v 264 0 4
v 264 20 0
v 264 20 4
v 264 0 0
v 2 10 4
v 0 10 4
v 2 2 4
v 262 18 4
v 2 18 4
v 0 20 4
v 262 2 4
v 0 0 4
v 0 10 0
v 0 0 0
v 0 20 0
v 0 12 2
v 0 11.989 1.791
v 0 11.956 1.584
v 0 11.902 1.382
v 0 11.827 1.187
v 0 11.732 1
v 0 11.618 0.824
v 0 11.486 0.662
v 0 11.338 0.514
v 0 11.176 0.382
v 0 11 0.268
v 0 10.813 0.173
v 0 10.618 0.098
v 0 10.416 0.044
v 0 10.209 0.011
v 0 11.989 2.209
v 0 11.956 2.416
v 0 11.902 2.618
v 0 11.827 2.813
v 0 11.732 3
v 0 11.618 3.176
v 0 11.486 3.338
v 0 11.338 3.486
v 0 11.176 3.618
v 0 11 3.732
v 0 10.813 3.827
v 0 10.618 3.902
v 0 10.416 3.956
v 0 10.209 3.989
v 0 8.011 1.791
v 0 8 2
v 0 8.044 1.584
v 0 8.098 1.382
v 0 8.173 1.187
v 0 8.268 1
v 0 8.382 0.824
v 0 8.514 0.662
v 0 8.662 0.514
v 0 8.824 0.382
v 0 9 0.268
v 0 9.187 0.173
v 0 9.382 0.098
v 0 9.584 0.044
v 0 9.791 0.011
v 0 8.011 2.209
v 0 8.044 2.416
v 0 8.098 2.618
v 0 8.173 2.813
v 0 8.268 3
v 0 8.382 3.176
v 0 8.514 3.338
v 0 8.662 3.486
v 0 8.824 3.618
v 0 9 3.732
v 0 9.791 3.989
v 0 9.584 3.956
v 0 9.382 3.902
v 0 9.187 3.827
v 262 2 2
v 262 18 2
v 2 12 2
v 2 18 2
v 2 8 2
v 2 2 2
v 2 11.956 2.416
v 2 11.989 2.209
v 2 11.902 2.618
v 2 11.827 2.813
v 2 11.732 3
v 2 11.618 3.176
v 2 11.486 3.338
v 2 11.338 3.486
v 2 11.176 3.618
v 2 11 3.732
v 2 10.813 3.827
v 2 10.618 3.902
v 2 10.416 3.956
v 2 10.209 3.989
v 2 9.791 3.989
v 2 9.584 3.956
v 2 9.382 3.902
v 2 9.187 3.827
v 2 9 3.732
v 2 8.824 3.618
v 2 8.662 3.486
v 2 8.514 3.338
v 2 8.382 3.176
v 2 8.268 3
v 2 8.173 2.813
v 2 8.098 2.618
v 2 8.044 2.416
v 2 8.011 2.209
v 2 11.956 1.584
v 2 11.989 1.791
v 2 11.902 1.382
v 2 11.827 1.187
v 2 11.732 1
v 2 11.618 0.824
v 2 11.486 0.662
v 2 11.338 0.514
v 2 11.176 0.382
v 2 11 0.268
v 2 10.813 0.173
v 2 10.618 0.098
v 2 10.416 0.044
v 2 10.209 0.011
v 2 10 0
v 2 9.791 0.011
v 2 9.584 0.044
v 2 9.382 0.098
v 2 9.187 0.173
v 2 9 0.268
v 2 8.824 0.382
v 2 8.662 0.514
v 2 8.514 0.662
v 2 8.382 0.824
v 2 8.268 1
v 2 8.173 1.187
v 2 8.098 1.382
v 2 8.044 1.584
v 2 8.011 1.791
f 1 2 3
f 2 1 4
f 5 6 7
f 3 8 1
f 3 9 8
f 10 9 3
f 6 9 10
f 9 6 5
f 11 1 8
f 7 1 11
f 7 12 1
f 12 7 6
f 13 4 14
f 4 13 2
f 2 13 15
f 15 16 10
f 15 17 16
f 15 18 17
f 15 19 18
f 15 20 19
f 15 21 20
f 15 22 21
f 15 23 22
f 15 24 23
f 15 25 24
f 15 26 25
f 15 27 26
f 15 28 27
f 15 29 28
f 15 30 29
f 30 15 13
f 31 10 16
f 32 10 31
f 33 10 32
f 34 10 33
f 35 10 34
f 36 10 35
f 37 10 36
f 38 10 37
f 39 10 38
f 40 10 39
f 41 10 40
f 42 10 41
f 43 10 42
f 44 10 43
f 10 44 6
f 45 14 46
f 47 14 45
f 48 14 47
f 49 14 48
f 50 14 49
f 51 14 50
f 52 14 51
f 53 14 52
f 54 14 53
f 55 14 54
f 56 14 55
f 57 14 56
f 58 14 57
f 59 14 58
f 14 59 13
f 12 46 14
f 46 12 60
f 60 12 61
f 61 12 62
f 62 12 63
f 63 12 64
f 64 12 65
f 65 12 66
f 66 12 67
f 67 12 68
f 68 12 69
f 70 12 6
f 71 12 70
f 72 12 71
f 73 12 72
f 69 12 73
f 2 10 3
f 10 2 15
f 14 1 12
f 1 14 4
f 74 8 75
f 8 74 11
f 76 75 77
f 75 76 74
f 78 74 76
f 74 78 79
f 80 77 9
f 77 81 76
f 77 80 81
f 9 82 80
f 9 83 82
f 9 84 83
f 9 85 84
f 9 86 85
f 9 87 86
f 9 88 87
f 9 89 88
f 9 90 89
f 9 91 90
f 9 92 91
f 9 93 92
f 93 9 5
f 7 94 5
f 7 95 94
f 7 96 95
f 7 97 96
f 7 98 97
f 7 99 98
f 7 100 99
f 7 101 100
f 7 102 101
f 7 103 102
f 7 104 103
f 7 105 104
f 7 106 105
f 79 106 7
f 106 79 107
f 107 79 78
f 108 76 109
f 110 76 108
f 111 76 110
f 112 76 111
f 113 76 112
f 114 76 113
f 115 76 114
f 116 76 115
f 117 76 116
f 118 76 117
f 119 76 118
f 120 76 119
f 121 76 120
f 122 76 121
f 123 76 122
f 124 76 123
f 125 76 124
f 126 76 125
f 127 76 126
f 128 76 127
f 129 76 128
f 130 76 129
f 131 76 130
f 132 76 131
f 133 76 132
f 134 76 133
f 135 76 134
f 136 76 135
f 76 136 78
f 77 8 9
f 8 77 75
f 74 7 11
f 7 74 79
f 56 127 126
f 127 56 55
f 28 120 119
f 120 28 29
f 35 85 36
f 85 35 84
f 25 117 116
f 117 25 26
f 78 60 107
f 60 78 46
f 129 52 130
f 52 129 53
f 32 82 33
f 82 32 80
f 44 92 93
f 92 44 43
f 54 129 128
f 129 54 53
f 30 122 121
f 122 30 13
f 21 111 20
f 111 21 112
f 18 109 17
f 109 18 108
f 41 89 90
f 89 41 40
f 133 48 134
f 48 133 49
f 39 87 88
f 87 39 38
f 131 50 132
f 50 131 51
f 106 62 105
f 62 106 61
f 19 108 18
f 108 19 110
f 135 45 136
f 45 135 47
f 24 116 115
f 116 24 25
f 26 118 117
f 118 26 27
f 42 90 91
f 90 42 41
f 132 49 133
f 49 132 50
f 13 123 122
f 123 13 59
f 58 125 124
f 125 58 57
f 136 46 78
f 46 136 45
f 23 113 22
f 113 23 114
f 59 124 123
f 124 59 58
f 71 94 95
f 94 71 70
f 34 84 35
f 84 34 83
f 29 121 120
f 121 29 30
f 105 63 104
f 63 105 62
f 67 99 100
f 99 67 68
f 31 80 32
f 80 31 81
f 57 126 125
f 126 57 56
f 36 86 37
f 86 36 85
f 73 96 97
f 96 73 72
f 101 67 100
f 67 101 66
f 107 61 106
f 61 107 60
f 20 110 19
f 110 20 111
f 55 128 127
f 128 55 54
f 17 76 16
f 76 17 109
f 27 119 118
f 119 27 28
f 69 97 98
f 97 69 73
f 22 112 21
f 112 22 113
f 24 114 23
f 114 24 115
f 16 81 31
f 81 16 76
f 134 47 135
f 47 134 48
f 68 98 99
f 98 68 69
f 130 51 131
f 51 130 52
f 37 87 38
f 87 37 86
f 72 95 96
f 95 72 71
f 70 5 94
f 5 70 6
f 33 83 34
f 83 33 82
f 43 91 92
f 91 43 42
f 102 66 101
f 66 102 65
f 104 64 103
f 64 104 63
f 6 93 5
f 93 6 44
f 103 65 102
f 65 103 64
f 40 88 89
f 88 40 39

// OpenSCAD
// file: ../references.scad
// Size
//Naming
// _PT = printable
// _ES = exact size
// _IS = insertable with force but no gaps

//--------------cables  (CB)

//----Ethernet (rj45)

//not mesured yet
CB_RJ45_Diameter_ES=4; 

//--------------threaded rod  (TR)

//----M5

TR_M5_Diameter_ES = 5.8;
//for a hole 
TR_M5_Diamater_IS = 6;
TR_M5_Diamater_PT = 7;


//----M10

TR_M10_Diameter_ES = 9.6;
//for a hole 
TR_M10_Diamater_IS = 10;
TR_M10_Diamater_PT = 12;

//--------------Screw (SC)
//----M3

module body_M3(height_input){
    cylinder(d=SC_M3_Diameter_PT,h=height_input,$fn=60);
    
    }
    
SC_M3_Diameter_ES = 2.96;
SC_M3_Head_Diameter_ES = 5.90;
SC_M3_Head_Height_ES = 2.32;
//for a hole 
SC_M3_Diameter_PT = 4; 


//----M5

SC_M5_Diameter_ES = 4.86;
SC_M5_Head_Diameter_ES = 9.24;
SC_M5_Head_Height_ES = 3.0;
//for a hole 
SC_M5_Diamater_IS = 5;
SC_M5_Diamater_PT = 0; //inconnu pour le moment


//--------------Nut Bolt (NB)

module nut_M3(height_input){
    cylinder(d=NB_M3_Diameter_C2C_PT,h=height_input,$fn=6);
    
    }

//----M3
// Side to side = from 2 paralelle faces S2S
// corner to corner = from 2 corners C2C


NB_M3_Diameter_S2S_ES = 5.30;
NB_M3_Diameter_C2C_ES = 6.0;

NB_M3_Diameter_S2S_PT = 6.30; //reducing as well
NB_M3_Diameter_C2C_PT = 7.0; //8.0 was too much 


//--------------Zip ties (ZT)

//Big zip ties I got    

ZT_length_ES = 300;
ZT_width_ES = 4.8;
ZT_height_ES = 1;

ZT_width_PT = 7;
ZT_height_PT = 3;

//--------------Velcro tape (VT)



VT_length_ES = 300;
VT_width_ES = 20;
VT_height_ES = 1;

VT_width_PT = 22;
VT_height_PT = 3;



//--------------Switch (SW)
//switch from castorama 
SW_length_ES = 13;
SW_width_ES = 8;
SW_height_ES = 14;

SW_length_PT = 15;
SW_width_PT = 10;
SW_height_PT = 16;


//switch from aliexpress
SW_AL_tube_width_ES = 5.7;
SW_AL_tube_width_PT = 7;

module custom_cylinder_switch(translated_position_X, translated_position_Y,translated_position_Z,heigh_input) {
    translate([translated_position_X, translated_position_Y, translated_position_Z]){ 
        rotate([90,0,0]){
            cylinder(d=SW_AL_tube_width_PT, h=heigh_input, $fn=30);
        }
    }
}
module custom_cylinder(rotate_input,translate_input,diameter_object,height_object){
    translate(translate_input){
        rotate(rotate_input){
            cylinder(d=diameter_object,h=height_object,$fn=60);
        }
    }
}

//--------------generic connectors (GC)
// USB C (USB-C)
GC_USB_C_length_ES = 7.3;
GC_USB_C_width_ES = 8.8;
GC_USB_C_height_ES = 3;

module USB_C(rotate_input,translate_input){
    translate(translate_input){
    rotate(rotate_input){
        hull(){
    cylinder(d=GC_USB_C_height_ES,h=GC_USB_C_length_ES,$fn=60);
translate([0,GC_USB_C_width_ES-GC_USB_C_height_ES,0]){
    cylinder(d=GC_USB_C_height_ES,h=GC_USB_C_length_ES,$fn=60);
}
}
    }
}
}

//--------------battery from vapes (BV)

//vapes crystal pro battery (CP)
BV_CP_length_ES = 34;
BV_CP_width_ES = 20;
BV_CP_height_ES = BV_CP_width_ES; //(because it's a cylinder)

BV_CP_length_PT = 37;
BV_CP_width_PT = 22;
BV_CP_height_PT = BV_CP_width_ES; //(because it's a cylinder)

//dimension list [legnth, width, height]
//BV_CP_PT=[37,22,22];
BV_CP_PT=[BV_CP_length_PT,BV_CP_width_PT,BV_CP_height_PT];

module vapes_battery(input_list,rotate_input,translate_input){
translate(translate_input){
    rotate(rotate_input){
        color("green")cylinder(d=input_list[1],h=input_list[0],$fn=60);
    }
    }
}


//--------------battery charger (BC)
//Board Charger TP4056 Module  (TP)

//https://www.az-delivery.uk/cdn/shop/products/tp4056-batterieladungsmodul-usb-typ-c-schutzschaltung-led-anzeigen-fur-ihre-li-ion-oder-lipo-einzelzellenbatterien-126337.jpg?v=1694708173


BC_TP_length_ES = 28;
BC_TP_full_length_ES = 28; //usb C end included
BC_TP_width_ES = 17;
BC_TP_height_ES = 1.3; //without USB C
BC_TP_full_height_ES = 5; //with USB C



//usb C connector position
BC_TP_width_from_side_ES = 8.44;//center of USB C connector from bottom (view from the top )
BC_TP_height_from_bottom_ES = 3.4;//center of USB C connector from bottom (view from the top )
BC_TP_negative_length_ES = 2;//center of USB C connector from bottom 

module battery_charger(rotate_input,translate_input){
    translate(translate_input){
    rotate(rotate_input){
        color("green"){
            cube([BC_TP_full_length_ES,BC_TP_width_ES,BC_TP_height_ES]);

                rotate_array_USB_C=[0,90,0];
    translate_array_USB_C=[-BC_TP_negative_length_ES,BC_TP_width_ES/2-(GC_USB_C_width_ES-GC_USB_C_height_ES)/2,GC_USB_C_height_ES/2+BC_TP_height_ES];
    
    USB_C(rotate_array_USB_C,translate_array_USB_C);

            
            }
    }
}
    
    }


//https://www.alectrofag.co.uk/cdn/shop/files/Hayati_Pro_Max_4000_Puffs_Disposable_Vape.jpg?v=1725012272




//https://d138zd1ktt9iqe.cloudfront.net/media/seo_landing_files/length-width-height-01-1646654708.png
// main file
include <../../Household/references.scad>

// Define variables for the dimensions and hole positions in millimeters

//size LED string
length_led_string = 260;
width_led_string = 16;
height_led_string = 2;

//structure
wall_thickness = 2;
gap_for_room = 2;


module hole_for_cable(){
    rotate_array_cable=[0,90,0];
    translate_array_cable=[0,(width_led_string+gap_for_room+wall_thickness)/2,(height_led_string+gap_for_room)/2];
    custom_cylinder(rotate_input=rotate_array_cable,translate_input=translate_array_cable,diameter_object=CB_RJ45_Diameter_ES,height_object=wall_thickness);
    }


module main(){
    difference() {
        cube([(length_led_string+gap_for_room+wall_thickness),width_led_string+gap_for_room+wall_thickness ,height_led_string+gap_for_room]);
        translate([(gap_for_room+wall_thickness)/2,(gap_for_room+wall_thickness)/2,(gap_for_room)]){
            cube([length_led_string,width_led_string ,height_led_string ]);
        }
        color("red")hole_for_cable();
    }
}


main();
